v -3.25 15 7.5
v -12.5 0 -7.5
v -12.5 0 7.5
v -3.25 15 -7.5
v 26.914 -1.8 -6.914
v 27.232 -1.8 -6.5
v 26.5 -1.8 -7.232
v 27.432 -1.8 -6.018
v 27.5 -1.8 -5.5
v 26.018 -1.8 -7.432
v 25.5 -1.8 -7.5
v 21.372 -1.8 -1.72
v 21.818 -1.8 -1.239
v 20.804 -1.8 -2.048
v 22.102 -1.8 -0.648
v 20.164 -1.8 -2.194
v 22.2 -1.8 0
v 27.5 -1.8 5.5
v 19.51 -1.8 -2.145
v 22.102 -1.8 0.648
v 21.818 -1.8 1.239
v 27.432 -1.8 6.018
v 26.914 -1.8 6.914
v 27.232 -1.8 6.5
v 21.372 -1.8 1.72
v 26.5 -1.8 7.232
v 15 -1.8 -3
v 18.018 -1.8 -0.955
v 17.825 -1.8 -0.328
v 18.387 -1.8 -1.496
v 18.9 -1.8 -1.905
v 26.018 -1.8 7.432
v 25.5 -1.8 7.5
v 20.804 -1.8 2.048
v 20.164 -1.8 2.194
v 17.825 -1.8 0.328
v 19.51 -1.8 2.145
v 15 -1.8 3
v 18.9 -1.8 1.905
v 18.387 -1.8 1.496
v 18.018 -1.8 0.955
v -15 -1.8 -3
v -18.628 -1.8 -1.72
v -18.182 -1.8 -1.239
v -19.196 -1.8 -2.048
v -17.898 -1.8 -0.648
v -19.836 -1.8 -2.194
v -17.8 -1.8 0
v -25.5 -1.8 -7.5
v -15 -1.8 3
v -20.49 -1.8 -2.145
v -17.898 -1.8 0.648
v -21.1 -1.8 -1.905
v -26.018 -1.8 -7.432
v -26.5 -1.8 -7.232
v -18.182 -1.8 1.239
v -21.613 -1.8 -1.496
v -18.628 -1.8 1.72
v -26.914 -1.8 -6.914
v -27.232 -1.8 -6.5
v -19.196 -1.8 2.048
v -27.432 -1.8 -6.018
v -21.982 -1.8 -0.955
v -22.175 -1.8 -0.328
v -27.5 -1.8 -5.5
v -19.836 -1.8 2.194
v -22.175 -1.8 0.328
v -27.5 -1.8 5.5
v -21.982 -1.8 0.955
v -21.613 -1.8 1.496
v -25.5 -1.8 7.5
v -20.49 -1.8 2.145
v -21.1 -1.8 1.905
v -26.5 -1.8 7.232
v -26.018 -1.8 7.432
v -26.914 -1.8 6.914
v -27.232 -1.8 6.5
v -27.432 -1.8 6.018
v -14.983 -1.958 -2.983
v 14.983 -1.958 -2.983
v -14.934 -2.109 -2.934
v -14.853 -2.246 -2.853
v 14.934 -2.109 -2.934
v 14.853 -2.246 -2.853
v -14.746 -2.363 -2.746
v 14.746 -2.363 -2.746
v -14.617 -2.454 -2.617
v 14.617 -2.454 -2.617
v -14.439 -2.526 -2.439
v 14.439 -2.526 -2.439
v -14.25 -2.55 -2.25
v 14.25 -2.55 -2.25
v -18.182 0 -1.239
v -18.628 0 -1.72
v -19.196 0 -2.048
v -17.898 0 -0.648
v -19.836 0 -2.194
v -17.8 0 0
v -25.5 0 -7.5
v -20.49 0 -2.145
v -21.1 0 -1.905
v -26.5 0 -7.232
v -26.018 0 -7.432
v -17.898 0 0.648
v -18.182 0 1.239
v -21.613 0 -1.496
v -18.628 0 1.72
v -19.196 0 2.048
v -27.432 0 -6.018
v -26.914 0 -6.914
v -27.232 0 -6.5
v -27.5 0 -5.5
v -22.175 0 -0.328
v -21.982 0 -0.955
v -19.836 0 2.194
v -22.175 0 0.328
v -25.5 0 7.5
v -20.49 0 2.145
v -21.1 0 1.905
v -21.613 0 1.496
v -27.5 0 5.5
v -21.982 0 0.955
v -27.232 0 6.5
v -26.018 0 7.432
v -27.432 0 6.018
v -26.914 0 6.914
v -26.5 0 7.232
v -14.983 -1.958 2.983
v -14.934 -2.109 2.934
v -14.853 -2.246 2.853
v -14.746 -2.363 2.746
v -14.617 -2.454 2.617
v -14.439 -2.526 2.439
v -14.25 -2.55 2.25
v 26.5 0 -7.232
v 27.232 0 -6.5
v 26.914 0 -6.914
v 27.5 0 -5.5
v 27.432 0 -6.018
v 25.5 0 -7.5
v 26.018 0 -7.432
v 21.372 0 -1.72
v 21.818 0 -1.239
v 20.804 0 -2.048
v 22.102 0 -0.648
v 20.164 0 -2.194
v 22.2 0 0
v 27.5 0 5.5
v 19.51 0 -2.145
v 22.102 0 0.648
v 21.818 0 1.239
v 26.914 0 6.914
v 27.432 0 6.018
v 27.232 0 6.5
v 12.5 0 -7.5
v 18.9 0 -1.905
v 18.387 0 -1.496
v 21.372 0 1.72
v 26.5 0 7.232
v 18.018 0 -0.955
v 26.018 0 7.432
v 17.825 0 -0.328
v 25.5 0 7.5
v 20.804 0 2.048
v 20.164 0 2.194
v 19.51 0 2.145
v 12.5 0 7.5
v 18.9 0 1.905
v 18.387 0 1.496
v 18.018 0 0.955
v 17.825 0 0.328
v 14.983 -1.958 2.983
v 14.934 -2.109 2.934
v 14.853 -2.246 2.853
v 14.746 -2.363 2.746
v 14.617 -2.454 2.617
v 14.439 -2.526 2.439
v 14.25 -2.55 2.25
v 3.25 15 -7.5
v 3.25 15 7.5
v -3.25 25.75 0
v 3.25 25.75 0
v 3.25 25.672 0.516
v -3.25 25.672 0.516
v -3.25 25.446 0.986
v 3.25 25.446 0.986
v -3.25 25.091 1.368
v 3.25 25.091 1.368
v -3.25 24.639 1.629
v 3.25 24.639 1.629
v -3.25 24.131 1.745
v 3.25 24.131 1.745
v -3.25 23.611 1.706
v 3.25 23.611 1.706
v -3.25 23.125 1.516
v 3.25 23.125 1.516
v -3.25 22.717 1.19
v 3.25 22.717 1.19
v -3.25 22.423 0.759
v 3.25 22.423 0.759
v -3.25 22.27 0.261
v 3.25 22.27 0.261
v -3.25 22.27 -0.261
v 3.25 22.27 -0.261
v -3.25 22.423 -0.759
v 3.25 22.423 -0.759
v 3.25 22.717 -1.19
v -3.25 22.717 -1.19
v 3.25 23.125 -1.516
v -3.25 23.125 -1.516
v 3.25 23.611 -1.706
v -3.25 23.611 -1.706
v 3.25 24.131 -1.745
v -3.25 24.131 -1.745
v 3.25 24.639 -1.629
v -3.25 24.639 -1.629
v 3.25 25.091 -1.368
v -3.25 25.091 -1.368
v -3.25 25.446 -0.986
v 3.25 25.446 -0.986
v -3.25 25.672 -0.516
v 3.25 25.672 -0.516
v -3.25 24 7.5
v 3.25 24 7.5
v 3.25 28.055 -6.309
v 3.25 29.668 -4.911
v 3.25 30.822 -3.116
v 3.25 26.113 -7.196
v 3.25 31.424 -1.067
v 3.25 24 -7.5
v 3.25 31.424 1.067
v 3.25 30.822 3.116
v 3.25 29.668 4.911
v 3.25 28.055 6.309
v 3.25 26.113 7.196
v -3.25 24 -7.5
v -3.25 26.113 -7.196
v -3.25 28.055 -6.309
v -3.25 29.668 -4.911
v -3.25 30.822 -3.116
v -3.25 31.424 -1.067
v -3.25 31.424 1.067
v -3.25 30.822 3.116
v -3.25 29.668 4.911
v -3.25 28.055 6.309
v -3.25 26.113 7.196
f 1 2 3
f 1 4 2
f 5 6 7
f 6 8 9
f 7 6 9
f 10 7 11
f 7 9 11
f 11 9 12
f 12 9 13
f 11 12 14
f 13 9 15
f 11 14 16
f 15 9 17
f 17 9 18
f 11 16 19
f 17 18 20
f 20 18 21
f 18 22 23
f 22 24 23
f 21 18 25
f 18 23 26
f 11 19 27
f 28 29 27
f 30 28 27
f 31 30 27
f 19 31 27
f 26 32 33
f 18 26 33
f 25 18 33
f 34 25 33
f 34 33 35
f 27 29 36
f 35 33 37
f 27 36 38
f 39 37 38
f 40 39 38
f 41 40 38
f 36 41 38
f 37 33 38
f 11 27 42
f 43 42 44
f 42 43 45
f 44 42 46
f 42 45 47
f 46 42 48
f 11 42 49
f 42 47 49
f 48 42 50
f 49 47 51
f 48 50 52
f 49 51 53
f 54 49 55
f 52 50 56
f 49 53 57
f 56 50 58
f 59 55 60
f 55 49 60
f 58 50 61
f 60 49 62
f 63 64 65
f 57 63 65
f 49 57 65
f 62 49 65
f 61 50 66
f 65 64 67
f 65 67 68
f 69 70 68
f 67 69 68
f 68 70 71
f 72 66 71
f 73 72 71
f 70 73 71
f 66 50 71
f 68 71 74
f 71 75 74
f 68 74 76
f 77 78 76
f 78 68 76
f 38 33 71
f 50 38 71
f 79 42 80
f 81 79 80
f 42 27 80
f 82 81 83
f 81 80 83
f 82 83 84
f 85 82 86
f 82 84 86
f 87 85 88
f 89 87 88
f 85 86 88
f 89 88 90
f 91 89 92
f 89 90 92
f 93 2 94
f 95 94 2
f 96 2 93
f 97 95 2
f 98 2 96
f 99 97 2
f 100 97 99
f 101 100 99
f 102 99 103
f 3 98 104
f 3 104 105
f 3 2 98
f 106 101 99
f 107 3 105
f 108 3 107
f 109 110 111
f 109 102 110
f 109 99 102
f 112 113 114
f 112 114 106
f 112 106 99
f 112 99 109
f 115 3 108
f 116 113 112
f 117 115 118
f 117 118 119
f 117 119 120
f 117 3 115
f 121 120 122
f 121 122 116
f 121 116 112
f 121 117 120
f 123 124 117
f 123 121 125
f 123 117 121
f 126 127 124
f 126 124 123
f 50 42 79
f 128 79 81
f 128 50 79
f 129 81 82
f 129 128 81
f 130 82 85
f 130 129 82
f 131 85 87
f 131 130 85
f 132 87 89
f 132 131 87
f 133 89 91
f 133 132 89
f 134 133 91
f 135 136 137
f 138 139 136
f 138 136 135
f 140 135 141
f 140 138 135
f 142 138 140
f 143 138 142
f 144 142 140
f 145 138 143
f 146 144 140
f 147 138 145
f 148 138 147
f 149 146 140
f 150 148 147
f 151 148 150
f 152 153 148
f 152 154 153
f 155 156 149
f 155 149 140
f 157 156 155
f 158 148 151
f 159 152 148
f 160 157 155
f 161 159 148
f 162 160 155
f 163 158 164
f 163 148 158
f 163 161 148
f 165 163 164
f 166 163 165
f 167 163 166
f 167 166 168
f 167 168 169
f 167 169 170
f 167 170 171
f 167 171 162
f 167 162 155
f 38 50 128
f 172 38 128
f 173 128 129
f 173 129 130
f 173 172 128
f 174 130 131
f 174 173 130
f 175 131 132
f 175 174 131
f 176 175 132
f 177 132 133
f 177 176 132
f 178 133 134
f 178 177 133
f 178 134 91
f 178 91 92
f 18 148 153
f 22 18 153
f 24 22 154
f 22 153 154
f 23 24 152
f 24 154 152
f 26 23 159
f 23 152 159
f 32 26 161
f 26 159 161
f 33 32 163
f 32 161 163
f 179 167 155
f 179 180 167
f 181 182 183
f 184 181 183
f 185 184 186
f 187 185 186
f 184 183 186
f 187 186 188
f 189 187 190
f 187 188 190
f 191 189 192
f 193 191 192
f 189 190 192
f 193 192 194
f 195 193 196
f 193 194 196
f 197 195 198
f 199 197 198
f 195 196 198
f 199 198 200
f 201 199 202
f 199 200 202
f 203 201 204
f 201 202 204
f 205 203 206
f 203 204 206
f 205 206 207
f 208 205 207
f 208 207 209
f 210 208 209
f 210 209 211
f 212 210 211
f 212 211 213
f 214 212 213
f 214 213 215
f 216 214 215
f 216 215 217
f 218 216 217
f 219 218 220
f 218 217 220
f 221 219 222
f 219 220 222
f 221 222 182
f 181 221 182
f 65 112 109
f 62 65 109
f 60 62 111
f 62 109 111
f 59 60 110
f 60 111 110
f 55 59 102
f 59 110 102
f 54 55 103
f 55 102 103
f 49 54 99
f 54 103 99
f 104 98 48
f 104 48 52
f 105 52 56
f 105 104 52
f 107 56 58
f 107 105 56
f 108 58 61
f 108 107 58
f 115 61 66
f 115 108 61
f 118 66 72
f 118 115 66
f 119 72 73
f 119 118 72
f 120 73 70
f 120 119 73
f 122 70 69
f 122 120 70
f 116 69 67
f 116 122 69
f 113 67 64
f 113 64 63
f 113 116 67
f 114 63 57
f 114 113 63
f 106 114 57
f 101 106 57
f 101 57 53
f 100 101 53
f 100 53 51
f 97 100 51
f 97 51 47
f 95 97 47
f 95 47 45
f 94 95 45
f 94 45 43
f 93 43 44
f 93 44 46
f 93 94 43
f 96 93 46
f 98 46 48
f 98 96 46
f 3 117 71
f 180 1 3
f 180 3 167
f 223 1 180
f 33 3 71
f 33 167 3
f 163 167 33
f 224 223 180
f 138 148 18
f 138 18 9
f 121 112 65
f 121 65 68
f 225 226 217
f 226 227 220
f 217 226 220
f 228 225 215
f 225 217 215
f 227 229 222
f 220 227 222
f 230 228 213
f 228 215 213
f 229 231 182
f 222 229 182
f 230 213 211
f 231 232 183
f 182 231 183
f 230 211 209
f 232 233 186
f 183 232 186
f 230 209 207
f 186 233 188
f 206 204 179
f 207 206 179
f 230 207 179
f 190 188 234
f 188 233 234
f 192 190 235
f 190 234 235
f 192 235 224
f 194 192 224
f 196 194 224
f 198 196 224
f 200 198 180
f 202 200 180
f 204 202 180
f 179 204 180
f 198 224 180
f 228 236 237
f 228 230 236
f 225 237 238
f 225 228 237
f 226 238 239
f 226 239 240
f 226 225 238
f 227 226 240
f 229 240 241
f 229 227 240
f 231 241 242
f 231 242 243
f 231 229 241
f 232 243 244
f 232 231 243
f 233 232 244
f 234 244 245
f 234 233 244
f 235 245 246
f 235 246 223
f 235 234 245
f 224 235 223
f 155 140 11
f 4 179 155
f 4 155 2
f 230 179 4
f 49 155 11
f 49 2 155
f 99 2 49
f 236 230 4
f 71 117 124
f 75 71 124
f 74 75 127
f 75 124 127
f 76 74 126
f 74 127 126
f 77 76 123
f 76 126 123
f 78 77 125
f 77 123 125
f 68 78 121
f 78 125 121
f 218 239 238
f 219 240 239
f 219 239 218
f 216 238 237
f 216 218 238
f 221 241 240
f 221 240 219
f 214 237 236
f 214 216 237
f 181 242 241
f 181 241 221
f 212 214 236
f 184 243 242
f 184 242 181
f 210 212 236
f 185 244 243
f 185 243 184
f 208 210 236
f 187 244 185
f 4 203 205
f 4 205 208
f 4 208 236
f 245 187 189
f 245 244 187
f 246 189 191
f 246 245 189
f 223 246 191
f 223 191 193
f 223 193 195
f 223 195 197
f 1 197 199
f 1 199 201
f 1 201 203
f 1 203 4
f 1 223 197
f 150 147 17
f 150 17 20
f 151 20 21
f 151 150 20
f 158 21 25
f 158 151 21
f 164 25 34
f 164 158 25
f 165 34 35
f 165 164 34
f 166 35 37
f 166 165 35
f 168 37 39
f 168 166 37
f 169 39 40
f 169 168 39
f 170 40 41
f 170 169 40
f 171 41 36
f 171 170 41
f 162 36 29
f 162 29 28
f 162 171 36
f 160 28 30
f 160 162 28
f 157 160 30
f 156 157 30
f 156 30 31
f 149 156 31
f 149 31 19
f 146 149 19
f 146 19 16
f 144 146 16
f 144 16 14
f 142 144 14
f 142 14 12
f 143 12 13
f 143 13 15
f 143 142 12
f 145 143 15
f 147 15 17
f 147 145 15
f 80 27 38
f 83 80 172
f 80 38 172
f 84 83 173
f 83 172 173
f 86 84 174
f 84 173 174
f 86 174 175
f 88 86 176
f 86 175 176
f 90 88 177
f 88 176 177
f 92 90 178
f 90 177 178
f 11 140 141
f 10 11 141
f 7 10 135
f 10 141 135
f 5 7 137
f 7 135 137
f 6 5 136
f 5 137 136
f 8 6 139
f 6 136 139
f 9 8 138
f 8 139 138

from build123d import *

# Parameters (mm, degrees)
SKETCH014_R          = 2.2
PAD013_DEPTH         = 1.8
SKETCH015_W          = 30
SKETCH015_H          = 6
PAD014_DEPTH         = 0.75
FILLET004_R          = 0.7499
SKETCH016_W          = 25
SKETCH016_H          = 15
SKETCH017_W          = 6.5
SKETCH017_H          = 15
LOFT_PLACEMENT_ANGLE = 180
PAD015_DEPTH         = 3.25
SKETCH019_R          = 1.75
POCKET003_DEPTH      = 6.5


with BuildPart() as fillet004:
    # Sketch014 → Pad013 (new body)
    with BuildSketch(Plane.XZ):
        with BuildLine():
            Line((-25.5, 7.5), (25.5, 7.5))
            ThreePointArc((27.5, 5.5), (26.914214, 6.914214), (25.5, 7.5))
            Line((27.5, 5.5), (27.5, -5.5))
            ThreePointArc((25.5, -7.5), (26.914214, -6.914214), (27.5, -5.5))
            Line((25.5, -7.5), (-25.5, -7.5))
            ThreePointArc((-27.5, -5.5), (-26.914214, -6.914214), (-25.5, -7.5))
            Line((-27.5, -5.5), (-27.5, 5.5))
            ThreePointArc((-25.5, 7.5), (-26.914214, 6.914214), (-27.5, 5.5))
        make_face()
        with Locations((-20, 0)):
            Circle(SKETCH014_R, mode=Mode.SUBTRACT)
        with Locations((20, 0)):
            Circle(SKETCH014_R, mode=Mode.SUBTRACT)
    extrude(amount=PAD013_DEPTH)

    # Sketch015 → Pad014 (new body)
    with BuildSketch(Plane.XZ.offset(1.8)):
        Rectangle(SKETCH015_W, SKETCH015_H)
    extrude(amount=PAD014_DEPTH)

    # Fillet004
    fillet004_edges = [fillet004.edges().sort_by_distance(p)[0] for p in [
        (-15, -2.55, 0),
        (0, -2.55, 3),
        (15, -2.55, 0),
        (0, -2.55, -3),
    ]]
    fillet(fillet004_edges, radius=FILLET004_R)


with BuildPart() as fusion001:
    # Sketch016 → Loft section 0
    with BuildSketch(Plane.XZ):
        Rectangle(SKETCH016_W, SKETCH016_H)
    # Sketch017 → Loft section 1
    with BuildSketch(Plane.XZ.offset(15)):
        Rectangle(SKETCH017_W, SKETCH017_H)
    loft(ruled=True)


with BuildPart() as fusion001_1:
    # Loft placement: moved
    add(fusion001.part.rotate(Axis((0, 0, 0), (0, 0, 1)), LOFT_PLACEMENT_ANGLE))

    # Fusion001: union Fillet004
    add(fillet004.part)


with BuildPart() as fusion002:
    # Sketch018 → Pad015 (new body, symmetric)
    with BuildSketch(Plane(origin=(0, 15, 0), x_dir=(0, 1, 0), z_dir=(1, 0, 0))):
        with BuildLine():
            Line((0, 7.5), (9, 7.5))
            ThreePointArc((9, -7.5), (16.5, 0), (9, 7.5))
            Line((9, -7.5), (0, -7.5))
            Line((0, -7.5), (0, 7.5))
        make_face()
    extrude(amount=PAD015_DEPTH, both=True)

    # Sketch019 → Pocket003 (cut)
    with BuildSketch(Plane(origin=(3.25, 15, 0), x_dir=(0, 1, 0), z_dir=(1, 0, 0))):
        with Locations((9, 0)):
            Circle(SKETCH019_R)
    extrude(amount=-POCKET003_DEPTH, mode=Mode.SUBTRACT)

    # Fusion002: union Fusion001
    add(fusion001_1.part)


solid = fusion002.part
